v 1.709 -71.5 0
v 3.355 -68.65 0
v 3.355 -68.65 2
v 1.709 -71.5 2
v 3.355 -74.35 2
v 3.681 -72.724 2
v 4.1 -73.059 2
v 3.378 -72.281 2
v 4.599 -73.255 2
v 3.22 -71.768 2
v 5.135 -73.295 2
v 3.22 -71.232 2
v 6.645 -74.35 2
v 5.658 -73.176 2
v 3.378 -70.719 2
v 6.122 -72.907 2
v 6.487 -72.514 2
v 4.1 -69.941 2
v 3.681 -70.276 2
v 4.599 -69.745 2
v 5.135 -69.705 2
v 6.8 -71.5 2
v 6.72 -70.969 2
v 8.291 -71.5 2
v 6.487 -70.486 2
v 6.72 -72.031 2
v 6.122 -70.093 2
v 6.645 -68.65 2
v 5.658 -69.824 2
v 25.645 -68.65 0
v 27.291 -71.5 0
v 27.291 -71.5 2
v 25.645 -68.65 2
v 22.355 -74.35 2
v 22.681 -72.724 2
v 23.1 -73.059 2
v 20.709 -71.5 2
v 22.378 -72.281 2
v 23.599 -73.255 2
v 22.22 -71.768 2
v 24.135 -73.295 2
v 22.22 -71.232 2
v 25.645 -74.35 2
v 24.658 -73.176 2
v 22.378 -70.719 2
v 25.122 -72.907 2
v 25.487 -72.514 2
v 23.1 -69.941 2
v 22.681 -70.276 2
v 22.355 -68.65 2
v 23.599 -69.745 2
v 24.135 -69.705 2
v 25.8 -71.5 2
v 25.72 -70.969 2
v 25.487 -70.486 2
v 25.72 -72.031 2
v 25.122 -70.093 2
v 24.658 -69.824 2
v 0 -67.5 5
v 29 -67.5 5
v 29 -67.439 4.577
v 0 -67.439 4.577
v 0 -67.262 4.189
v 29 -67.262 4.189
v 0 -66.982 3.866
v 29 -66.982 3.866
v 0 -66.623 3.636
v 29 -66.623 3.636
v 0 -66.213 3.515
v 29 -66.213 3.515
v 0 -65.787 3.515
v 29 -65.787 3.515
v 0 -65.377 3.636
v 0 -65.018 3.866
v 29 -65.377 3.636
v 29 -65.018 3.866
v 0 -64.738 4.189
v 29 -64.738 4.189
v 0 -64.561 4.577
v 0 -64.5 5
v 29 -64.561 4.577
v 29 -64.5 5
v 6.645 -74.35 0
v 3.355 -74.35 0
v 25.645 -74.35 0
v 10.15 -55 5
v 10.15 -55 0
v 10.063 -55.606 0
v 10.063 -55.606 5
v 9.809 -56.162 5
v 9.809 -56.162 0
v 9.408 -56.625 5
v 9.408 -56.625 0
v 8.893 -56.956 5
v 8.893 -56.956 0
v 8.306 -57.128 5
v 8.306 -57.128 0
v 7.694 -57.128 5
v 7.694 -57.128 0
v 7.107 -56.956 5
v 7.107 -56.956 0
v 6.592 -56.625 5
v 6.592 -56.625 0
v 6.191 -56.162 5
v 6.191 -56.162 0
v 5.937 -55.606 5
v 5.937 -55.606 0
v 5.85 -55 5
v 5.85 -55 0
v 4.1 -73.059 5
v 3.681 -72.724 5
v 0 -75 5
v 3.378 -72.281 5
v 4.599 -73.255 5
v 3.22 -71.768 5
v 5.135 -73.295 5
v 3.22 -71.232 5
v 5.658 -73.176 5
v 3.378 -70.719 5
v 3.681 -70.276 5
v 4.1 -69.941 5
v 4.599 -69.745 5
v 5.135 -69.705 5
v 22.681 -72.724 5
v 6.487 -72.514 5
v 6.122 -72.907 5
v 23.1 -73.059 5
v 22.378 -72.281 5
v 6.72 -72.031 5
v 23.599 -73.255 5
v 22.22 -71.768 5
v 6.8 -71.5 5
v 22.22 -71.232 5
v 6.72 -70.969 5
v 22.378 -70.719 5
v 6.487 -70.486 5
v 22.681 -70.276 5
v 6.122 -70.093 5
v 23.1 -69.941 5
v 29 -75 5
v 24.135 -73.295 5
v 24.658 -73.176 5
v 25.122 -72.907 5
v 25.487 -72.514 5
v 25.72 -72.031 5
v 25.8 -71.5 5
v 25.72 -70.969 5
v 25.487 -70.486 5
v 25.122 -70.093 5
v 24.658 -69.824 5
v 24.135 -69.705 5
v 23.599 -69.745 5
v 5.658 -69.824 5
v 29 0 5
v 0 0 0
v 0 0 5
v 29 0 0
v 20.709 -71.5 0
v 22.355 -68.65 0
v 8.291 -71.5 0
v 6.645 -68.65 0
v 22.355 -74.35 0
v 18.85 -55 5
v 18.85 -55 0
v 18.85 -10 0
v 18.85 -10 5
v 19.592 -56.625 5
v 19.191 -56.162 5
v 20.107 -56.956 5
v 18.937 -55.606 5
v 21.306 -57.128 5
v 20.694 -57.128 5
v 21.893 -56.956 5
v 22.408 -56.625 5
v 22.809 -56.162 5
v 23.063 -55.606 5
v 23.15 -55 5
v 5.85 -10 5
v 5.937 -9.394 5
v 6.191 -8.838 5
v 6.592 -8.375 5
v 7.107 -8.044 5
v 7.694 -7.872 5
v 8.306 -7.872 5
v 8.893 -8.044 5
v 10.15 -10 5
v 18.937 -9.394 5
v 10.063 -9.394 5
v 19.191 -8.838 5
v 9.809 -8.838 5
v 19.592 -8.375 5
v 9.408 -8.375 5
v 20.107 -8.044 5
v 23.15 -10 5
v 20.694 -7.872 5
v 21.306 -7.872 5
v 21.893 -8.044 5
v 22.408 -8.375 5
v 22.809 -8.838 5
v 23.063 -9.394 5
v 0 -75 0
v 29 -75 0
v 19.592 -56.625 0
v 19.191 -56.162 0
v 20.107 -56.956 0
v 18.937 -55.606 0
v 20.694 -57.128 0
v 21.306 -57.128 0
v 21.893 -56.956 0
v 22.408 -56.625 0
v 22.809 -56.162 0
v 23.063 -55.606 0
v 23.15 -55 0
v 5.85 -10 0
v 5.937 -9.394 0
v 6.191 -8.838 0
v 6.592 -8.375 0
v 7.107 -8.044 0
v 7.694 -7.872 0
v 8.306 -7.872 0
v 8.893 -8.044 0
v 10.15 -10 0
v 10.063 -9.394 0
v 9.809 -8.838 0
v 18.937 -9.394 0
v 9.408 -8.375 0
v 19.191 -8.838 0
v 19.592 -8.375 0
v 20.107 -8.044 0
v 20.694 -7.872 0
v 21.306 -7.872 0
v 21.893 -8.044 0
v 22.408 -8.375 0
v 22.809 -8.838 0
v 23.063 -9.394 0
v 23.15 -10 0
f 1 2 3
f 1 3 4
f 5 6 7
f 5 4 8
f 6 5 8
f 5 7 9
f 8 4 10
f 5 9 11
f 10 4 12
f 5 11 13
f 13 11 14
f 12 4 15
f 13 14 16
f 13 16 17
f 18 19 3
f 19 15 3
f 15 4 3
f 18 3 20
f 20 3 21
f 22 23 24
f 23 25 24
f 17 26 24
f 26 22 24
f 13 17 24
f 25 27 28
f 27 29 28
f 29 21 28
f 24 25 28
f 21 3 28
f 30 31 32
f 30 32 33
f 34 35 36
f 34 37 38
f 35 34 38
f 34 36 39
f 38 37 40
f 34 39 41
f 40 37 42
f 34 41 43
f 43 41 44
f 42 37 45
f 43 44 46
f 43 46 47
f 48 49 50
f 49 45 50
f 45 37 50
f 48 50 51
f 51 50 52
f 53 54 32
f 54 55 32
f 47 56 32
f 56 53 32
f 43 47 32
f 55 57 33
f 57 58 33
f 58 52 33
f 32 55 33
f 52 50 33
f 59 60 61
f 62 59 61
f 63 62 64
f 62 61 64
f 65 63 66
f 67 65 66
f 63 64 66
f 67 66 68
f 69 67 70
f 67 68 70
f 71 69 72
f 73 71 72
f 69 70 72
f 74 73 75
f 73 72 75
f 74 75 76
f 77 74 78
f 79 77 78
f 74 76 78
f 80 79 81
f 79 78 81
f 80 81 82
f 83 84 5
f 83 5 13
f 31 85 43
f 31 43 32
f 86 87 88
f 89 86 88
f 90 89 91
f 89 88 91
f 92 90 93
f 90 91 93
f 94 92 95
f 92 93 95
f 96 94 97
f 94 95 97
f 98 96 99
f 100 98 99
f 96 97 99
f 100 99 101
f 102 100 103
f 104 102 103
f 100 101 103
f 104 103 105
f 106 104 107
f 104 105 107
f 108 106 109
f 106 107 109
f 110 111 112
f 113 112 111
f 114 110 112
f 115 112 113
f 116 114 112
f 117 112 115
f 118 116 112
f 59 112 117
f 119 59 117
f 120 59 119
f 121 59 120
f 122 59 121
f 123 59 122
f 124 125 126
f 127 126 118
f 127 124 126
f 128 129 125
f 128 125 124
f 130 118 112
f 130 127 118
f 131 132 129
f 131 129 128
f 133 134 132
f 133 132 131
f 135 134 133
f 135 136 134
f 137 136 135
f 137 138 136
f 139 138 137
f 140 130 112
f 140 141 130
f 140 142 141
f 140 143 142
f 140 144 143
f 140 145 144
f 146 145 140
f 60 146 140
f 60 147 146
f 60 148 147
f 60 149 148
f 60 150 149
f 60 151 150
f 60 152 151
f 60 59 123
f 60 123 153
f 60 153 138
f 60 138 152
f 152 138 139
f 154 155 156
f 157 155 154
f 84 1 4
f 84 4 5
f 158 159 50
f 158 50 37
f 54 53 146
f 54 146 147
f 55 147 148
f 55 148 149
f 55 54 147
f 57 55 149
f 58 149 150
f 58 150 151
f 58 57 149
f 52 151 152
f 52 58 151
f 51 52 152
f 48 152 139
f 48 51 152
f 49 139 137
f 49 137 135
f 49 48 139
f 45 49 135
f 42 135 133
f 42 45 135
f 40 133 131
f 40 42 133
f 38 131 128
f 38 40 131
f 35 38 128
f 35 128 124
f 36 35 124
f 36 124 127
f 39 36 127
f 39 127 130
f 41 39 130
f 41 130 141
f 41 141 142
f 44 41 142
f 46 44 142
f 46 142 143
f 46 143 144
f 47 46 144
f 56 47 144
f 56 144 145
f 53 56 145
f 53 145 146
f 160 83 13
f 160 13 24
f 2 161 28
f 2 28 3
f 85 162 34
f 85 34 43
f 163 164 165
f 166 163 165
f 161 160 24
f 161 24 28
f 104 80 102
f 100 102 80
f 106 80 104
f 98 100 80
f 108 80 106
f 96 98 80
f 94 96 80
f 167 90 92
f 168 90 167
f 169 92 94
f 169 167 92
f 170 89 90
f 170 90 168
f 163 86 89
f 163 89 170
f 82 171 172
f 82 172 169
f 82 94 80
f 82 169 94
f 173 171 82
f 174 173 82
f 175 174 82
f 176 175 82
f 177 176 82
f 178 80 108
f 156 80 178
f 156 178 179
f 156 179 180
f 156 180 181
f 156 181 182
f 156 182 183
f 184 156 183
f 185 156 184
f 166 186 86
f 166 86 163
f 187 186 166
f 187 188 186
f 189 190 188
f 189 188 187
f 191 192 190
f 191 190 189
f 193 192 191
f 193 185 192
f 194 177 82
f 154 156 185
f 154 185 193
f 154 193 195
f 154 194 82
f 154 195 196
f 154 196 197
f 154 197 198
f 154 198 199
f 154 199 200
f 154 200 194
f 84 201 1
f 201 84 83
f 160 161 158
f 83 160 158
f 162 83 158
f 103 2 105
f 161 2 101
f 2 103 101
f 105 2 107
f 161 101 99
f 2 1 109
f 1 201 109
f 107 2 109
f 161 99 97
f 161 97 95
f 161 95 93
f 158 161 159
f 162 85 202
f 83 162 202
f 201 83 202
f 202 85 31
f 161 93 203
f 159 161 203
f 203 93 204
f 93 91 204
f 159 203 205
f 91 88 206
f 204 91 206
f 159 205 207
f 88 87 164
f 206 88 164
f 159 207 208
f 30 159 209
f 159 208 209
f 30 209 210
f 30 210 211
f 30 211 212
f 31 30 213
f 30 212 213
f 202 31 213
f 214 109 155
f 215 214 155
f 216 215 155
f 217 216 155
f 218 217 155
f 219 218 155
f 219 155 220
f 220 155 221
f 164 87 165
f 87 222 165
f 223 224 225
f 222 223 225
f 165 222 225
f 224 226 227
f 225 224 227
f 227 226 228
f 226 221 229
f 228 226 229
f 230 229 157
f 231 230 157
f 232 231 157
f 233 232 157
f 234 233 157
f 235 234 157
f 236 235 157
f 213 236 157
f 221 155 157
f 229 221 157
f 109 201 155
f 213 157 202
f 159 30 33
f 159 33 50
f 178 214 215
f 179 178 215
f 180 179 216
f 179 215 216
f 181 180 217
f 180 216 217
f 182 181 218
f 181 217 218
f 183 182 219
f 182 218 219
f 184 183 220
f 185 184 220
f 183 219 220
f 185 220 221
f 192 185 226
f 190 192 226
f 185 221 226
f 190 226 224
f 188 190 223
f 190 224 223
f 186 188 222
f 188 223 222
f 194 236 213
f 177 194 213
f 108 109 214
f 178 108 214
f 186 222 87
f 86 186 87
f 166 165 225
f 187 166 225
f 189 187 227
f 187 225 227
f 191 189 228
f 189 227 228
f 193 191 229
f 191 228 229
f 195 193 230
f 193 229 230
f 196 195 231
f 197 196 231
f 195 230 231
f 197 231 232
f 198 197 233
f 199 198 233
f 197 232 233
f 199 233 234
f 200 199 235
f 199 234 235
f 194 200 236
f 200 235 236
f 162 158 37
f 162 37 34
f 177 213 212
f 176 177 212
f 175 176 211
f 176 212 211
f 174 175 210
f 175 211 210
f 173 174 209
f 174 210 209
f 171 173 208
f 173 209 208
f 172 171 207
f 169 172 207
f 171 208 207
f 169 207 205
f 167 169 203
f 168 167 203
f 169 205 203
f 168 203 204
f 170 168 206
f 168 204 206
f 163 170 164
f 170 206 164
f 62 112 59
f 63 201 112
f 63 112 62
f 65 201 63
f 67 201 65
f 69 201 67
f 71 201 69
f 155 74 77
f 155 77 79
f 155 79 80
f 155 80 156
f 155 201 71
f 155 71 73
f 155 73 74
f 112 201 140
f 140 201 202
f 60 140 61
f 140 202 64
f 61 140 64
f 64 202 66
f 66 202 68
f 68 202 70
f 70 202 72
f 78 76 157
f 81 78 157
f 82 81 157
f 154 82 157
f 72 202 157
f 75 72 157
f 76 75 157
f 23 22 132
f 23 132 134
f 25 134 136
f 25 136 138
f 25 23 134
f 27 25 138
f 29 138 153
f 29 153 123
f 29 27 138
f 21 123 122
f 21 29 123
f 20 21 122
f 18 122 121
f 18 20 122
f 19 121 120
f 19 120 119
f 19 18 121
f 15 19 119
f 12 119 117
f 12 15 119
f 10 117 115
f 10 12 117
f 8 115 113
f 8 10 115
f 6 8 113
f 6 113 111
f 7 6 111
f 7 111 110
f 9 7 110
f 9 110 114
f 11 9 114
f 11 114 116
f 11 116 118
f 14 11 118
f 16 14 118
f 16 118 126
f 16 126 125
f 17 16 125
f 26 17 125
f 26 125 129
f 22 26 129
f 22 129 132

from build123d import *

# Parameters (mm, degrees)
F0_W     = 29
F0_H     = 75
F0_R     = 1.8
F1_DEPTH = 5
F3_DEPTH = 29
F4_DEPTH = 2


with BuildPart() as f1:
    # F0 (on Top) → F1 (new body)
    with BuildSketch(Plane.XY):
        with Locations((14.5, -37.5)):
            Rectangle(F0_W, F0_H)
        Polygon((1.709103, -71.5), (3.354552, -68.65), (6.645448, -68.65), (8.290897, -71.5), (6.645448, -74.35), (3.354552, -74.35), align=None, mode=Mode.SUBTRACT)
        Polygon((20.709103, -71.5), (22.354552, -68.65), (25.645448, -68.65), (27.290897, -71.5), (25.645448, -74.35), (22.354552, -74.35), align=None, mode=Mode.SUBTRACT)
        with BuildLine():
            Line((5.85, -55), (5.85, -10))
            ThreePointArc((5.85, -10), (8, -7.85), (10.15, -10))
            Line((10.15, -10), (10.15, -55))
            ThreePointArc((10.15, -55), (8, -57.15), (5.85, -55))
        make_face(mode=Mode.SUBTRACT)
        with BuildLine():
            Line((18.85, -55), (18.85, -10))
            ThreePointArc((18.85, -10), (21, -7.85), (23.15, -10))
            Line((23.15, -10), (23.15, -55))
            ThreePointArc((23.15, -55), (21, -57.15), (18.85, -55))
        make_face(mode=Mode.SUBTRACT)
        Polygon((25.645448, -68.65), (22.354552, -68.65), (20.709103, -71.5), (22.354552, -74.35), (25.645448, -74.35), (27.290897, -71.5), align=None)
        with Locations((24, -71.5)):
            Circle(F0_R, mode=Mode.SUBTRACT)
        Polygon((6.645448, -68.65), (3.354552, -68.65), (1.709103, -71.5), (3.354552, -74.35), (6.645448, -74.35), (8.290897, -71.5), align=None)
        with Locations((5, -71.5)):
            Circle(F0_R, mode=Mode.SUBTRACT)
    extrude(amount=F1_DEPTH)

    # F2 (on face) → F3 (cut, through all)
    with BuildSketch(Plane.YZ.offset(29)):
        with BuildLine():
            Line((-64.5, 5), (-67.5, 5))
            ThreePointArc((-67.5, 5), (-66, 3.5), (-64.5, 5))
        make_face()
    extrude(amount=-F3_DEPTH, mode=Mode.SUBTRACT)

    # F0 (on Top) → F4 (cut)
    with BuildSketch(Plane.XY):
        with Locations((5, -71.5)):
            Circle(F0_R)
        with Locations((24, -71.5)):
            Circle(F0_R)
        Polygon((6.645448, -68.65), (3.354552, -68.65), (1.709103, -71.5), (3.354552, -74.35), (6.645448, -74.35), (8.290897, -71.5), align=None)
        with Locations((5, -71.5)):
            Circle(F0_R, mode=Mode.SUBTRACT)
        Polygon((25.645448, -68.65), (22.354552, -68.65), (20.709103, -71.5), (22.354552, -74.35), (25.645448, -74.35), (27.290897, -71.5), align=None)
        with Locations((24, -71.5)):
            Circle(F0_R, mode=Mode.SUBTRACT)
    extrude(amount=F4_DEPTH, mode=Mode.SUBTRACT)


solid = f1.part
